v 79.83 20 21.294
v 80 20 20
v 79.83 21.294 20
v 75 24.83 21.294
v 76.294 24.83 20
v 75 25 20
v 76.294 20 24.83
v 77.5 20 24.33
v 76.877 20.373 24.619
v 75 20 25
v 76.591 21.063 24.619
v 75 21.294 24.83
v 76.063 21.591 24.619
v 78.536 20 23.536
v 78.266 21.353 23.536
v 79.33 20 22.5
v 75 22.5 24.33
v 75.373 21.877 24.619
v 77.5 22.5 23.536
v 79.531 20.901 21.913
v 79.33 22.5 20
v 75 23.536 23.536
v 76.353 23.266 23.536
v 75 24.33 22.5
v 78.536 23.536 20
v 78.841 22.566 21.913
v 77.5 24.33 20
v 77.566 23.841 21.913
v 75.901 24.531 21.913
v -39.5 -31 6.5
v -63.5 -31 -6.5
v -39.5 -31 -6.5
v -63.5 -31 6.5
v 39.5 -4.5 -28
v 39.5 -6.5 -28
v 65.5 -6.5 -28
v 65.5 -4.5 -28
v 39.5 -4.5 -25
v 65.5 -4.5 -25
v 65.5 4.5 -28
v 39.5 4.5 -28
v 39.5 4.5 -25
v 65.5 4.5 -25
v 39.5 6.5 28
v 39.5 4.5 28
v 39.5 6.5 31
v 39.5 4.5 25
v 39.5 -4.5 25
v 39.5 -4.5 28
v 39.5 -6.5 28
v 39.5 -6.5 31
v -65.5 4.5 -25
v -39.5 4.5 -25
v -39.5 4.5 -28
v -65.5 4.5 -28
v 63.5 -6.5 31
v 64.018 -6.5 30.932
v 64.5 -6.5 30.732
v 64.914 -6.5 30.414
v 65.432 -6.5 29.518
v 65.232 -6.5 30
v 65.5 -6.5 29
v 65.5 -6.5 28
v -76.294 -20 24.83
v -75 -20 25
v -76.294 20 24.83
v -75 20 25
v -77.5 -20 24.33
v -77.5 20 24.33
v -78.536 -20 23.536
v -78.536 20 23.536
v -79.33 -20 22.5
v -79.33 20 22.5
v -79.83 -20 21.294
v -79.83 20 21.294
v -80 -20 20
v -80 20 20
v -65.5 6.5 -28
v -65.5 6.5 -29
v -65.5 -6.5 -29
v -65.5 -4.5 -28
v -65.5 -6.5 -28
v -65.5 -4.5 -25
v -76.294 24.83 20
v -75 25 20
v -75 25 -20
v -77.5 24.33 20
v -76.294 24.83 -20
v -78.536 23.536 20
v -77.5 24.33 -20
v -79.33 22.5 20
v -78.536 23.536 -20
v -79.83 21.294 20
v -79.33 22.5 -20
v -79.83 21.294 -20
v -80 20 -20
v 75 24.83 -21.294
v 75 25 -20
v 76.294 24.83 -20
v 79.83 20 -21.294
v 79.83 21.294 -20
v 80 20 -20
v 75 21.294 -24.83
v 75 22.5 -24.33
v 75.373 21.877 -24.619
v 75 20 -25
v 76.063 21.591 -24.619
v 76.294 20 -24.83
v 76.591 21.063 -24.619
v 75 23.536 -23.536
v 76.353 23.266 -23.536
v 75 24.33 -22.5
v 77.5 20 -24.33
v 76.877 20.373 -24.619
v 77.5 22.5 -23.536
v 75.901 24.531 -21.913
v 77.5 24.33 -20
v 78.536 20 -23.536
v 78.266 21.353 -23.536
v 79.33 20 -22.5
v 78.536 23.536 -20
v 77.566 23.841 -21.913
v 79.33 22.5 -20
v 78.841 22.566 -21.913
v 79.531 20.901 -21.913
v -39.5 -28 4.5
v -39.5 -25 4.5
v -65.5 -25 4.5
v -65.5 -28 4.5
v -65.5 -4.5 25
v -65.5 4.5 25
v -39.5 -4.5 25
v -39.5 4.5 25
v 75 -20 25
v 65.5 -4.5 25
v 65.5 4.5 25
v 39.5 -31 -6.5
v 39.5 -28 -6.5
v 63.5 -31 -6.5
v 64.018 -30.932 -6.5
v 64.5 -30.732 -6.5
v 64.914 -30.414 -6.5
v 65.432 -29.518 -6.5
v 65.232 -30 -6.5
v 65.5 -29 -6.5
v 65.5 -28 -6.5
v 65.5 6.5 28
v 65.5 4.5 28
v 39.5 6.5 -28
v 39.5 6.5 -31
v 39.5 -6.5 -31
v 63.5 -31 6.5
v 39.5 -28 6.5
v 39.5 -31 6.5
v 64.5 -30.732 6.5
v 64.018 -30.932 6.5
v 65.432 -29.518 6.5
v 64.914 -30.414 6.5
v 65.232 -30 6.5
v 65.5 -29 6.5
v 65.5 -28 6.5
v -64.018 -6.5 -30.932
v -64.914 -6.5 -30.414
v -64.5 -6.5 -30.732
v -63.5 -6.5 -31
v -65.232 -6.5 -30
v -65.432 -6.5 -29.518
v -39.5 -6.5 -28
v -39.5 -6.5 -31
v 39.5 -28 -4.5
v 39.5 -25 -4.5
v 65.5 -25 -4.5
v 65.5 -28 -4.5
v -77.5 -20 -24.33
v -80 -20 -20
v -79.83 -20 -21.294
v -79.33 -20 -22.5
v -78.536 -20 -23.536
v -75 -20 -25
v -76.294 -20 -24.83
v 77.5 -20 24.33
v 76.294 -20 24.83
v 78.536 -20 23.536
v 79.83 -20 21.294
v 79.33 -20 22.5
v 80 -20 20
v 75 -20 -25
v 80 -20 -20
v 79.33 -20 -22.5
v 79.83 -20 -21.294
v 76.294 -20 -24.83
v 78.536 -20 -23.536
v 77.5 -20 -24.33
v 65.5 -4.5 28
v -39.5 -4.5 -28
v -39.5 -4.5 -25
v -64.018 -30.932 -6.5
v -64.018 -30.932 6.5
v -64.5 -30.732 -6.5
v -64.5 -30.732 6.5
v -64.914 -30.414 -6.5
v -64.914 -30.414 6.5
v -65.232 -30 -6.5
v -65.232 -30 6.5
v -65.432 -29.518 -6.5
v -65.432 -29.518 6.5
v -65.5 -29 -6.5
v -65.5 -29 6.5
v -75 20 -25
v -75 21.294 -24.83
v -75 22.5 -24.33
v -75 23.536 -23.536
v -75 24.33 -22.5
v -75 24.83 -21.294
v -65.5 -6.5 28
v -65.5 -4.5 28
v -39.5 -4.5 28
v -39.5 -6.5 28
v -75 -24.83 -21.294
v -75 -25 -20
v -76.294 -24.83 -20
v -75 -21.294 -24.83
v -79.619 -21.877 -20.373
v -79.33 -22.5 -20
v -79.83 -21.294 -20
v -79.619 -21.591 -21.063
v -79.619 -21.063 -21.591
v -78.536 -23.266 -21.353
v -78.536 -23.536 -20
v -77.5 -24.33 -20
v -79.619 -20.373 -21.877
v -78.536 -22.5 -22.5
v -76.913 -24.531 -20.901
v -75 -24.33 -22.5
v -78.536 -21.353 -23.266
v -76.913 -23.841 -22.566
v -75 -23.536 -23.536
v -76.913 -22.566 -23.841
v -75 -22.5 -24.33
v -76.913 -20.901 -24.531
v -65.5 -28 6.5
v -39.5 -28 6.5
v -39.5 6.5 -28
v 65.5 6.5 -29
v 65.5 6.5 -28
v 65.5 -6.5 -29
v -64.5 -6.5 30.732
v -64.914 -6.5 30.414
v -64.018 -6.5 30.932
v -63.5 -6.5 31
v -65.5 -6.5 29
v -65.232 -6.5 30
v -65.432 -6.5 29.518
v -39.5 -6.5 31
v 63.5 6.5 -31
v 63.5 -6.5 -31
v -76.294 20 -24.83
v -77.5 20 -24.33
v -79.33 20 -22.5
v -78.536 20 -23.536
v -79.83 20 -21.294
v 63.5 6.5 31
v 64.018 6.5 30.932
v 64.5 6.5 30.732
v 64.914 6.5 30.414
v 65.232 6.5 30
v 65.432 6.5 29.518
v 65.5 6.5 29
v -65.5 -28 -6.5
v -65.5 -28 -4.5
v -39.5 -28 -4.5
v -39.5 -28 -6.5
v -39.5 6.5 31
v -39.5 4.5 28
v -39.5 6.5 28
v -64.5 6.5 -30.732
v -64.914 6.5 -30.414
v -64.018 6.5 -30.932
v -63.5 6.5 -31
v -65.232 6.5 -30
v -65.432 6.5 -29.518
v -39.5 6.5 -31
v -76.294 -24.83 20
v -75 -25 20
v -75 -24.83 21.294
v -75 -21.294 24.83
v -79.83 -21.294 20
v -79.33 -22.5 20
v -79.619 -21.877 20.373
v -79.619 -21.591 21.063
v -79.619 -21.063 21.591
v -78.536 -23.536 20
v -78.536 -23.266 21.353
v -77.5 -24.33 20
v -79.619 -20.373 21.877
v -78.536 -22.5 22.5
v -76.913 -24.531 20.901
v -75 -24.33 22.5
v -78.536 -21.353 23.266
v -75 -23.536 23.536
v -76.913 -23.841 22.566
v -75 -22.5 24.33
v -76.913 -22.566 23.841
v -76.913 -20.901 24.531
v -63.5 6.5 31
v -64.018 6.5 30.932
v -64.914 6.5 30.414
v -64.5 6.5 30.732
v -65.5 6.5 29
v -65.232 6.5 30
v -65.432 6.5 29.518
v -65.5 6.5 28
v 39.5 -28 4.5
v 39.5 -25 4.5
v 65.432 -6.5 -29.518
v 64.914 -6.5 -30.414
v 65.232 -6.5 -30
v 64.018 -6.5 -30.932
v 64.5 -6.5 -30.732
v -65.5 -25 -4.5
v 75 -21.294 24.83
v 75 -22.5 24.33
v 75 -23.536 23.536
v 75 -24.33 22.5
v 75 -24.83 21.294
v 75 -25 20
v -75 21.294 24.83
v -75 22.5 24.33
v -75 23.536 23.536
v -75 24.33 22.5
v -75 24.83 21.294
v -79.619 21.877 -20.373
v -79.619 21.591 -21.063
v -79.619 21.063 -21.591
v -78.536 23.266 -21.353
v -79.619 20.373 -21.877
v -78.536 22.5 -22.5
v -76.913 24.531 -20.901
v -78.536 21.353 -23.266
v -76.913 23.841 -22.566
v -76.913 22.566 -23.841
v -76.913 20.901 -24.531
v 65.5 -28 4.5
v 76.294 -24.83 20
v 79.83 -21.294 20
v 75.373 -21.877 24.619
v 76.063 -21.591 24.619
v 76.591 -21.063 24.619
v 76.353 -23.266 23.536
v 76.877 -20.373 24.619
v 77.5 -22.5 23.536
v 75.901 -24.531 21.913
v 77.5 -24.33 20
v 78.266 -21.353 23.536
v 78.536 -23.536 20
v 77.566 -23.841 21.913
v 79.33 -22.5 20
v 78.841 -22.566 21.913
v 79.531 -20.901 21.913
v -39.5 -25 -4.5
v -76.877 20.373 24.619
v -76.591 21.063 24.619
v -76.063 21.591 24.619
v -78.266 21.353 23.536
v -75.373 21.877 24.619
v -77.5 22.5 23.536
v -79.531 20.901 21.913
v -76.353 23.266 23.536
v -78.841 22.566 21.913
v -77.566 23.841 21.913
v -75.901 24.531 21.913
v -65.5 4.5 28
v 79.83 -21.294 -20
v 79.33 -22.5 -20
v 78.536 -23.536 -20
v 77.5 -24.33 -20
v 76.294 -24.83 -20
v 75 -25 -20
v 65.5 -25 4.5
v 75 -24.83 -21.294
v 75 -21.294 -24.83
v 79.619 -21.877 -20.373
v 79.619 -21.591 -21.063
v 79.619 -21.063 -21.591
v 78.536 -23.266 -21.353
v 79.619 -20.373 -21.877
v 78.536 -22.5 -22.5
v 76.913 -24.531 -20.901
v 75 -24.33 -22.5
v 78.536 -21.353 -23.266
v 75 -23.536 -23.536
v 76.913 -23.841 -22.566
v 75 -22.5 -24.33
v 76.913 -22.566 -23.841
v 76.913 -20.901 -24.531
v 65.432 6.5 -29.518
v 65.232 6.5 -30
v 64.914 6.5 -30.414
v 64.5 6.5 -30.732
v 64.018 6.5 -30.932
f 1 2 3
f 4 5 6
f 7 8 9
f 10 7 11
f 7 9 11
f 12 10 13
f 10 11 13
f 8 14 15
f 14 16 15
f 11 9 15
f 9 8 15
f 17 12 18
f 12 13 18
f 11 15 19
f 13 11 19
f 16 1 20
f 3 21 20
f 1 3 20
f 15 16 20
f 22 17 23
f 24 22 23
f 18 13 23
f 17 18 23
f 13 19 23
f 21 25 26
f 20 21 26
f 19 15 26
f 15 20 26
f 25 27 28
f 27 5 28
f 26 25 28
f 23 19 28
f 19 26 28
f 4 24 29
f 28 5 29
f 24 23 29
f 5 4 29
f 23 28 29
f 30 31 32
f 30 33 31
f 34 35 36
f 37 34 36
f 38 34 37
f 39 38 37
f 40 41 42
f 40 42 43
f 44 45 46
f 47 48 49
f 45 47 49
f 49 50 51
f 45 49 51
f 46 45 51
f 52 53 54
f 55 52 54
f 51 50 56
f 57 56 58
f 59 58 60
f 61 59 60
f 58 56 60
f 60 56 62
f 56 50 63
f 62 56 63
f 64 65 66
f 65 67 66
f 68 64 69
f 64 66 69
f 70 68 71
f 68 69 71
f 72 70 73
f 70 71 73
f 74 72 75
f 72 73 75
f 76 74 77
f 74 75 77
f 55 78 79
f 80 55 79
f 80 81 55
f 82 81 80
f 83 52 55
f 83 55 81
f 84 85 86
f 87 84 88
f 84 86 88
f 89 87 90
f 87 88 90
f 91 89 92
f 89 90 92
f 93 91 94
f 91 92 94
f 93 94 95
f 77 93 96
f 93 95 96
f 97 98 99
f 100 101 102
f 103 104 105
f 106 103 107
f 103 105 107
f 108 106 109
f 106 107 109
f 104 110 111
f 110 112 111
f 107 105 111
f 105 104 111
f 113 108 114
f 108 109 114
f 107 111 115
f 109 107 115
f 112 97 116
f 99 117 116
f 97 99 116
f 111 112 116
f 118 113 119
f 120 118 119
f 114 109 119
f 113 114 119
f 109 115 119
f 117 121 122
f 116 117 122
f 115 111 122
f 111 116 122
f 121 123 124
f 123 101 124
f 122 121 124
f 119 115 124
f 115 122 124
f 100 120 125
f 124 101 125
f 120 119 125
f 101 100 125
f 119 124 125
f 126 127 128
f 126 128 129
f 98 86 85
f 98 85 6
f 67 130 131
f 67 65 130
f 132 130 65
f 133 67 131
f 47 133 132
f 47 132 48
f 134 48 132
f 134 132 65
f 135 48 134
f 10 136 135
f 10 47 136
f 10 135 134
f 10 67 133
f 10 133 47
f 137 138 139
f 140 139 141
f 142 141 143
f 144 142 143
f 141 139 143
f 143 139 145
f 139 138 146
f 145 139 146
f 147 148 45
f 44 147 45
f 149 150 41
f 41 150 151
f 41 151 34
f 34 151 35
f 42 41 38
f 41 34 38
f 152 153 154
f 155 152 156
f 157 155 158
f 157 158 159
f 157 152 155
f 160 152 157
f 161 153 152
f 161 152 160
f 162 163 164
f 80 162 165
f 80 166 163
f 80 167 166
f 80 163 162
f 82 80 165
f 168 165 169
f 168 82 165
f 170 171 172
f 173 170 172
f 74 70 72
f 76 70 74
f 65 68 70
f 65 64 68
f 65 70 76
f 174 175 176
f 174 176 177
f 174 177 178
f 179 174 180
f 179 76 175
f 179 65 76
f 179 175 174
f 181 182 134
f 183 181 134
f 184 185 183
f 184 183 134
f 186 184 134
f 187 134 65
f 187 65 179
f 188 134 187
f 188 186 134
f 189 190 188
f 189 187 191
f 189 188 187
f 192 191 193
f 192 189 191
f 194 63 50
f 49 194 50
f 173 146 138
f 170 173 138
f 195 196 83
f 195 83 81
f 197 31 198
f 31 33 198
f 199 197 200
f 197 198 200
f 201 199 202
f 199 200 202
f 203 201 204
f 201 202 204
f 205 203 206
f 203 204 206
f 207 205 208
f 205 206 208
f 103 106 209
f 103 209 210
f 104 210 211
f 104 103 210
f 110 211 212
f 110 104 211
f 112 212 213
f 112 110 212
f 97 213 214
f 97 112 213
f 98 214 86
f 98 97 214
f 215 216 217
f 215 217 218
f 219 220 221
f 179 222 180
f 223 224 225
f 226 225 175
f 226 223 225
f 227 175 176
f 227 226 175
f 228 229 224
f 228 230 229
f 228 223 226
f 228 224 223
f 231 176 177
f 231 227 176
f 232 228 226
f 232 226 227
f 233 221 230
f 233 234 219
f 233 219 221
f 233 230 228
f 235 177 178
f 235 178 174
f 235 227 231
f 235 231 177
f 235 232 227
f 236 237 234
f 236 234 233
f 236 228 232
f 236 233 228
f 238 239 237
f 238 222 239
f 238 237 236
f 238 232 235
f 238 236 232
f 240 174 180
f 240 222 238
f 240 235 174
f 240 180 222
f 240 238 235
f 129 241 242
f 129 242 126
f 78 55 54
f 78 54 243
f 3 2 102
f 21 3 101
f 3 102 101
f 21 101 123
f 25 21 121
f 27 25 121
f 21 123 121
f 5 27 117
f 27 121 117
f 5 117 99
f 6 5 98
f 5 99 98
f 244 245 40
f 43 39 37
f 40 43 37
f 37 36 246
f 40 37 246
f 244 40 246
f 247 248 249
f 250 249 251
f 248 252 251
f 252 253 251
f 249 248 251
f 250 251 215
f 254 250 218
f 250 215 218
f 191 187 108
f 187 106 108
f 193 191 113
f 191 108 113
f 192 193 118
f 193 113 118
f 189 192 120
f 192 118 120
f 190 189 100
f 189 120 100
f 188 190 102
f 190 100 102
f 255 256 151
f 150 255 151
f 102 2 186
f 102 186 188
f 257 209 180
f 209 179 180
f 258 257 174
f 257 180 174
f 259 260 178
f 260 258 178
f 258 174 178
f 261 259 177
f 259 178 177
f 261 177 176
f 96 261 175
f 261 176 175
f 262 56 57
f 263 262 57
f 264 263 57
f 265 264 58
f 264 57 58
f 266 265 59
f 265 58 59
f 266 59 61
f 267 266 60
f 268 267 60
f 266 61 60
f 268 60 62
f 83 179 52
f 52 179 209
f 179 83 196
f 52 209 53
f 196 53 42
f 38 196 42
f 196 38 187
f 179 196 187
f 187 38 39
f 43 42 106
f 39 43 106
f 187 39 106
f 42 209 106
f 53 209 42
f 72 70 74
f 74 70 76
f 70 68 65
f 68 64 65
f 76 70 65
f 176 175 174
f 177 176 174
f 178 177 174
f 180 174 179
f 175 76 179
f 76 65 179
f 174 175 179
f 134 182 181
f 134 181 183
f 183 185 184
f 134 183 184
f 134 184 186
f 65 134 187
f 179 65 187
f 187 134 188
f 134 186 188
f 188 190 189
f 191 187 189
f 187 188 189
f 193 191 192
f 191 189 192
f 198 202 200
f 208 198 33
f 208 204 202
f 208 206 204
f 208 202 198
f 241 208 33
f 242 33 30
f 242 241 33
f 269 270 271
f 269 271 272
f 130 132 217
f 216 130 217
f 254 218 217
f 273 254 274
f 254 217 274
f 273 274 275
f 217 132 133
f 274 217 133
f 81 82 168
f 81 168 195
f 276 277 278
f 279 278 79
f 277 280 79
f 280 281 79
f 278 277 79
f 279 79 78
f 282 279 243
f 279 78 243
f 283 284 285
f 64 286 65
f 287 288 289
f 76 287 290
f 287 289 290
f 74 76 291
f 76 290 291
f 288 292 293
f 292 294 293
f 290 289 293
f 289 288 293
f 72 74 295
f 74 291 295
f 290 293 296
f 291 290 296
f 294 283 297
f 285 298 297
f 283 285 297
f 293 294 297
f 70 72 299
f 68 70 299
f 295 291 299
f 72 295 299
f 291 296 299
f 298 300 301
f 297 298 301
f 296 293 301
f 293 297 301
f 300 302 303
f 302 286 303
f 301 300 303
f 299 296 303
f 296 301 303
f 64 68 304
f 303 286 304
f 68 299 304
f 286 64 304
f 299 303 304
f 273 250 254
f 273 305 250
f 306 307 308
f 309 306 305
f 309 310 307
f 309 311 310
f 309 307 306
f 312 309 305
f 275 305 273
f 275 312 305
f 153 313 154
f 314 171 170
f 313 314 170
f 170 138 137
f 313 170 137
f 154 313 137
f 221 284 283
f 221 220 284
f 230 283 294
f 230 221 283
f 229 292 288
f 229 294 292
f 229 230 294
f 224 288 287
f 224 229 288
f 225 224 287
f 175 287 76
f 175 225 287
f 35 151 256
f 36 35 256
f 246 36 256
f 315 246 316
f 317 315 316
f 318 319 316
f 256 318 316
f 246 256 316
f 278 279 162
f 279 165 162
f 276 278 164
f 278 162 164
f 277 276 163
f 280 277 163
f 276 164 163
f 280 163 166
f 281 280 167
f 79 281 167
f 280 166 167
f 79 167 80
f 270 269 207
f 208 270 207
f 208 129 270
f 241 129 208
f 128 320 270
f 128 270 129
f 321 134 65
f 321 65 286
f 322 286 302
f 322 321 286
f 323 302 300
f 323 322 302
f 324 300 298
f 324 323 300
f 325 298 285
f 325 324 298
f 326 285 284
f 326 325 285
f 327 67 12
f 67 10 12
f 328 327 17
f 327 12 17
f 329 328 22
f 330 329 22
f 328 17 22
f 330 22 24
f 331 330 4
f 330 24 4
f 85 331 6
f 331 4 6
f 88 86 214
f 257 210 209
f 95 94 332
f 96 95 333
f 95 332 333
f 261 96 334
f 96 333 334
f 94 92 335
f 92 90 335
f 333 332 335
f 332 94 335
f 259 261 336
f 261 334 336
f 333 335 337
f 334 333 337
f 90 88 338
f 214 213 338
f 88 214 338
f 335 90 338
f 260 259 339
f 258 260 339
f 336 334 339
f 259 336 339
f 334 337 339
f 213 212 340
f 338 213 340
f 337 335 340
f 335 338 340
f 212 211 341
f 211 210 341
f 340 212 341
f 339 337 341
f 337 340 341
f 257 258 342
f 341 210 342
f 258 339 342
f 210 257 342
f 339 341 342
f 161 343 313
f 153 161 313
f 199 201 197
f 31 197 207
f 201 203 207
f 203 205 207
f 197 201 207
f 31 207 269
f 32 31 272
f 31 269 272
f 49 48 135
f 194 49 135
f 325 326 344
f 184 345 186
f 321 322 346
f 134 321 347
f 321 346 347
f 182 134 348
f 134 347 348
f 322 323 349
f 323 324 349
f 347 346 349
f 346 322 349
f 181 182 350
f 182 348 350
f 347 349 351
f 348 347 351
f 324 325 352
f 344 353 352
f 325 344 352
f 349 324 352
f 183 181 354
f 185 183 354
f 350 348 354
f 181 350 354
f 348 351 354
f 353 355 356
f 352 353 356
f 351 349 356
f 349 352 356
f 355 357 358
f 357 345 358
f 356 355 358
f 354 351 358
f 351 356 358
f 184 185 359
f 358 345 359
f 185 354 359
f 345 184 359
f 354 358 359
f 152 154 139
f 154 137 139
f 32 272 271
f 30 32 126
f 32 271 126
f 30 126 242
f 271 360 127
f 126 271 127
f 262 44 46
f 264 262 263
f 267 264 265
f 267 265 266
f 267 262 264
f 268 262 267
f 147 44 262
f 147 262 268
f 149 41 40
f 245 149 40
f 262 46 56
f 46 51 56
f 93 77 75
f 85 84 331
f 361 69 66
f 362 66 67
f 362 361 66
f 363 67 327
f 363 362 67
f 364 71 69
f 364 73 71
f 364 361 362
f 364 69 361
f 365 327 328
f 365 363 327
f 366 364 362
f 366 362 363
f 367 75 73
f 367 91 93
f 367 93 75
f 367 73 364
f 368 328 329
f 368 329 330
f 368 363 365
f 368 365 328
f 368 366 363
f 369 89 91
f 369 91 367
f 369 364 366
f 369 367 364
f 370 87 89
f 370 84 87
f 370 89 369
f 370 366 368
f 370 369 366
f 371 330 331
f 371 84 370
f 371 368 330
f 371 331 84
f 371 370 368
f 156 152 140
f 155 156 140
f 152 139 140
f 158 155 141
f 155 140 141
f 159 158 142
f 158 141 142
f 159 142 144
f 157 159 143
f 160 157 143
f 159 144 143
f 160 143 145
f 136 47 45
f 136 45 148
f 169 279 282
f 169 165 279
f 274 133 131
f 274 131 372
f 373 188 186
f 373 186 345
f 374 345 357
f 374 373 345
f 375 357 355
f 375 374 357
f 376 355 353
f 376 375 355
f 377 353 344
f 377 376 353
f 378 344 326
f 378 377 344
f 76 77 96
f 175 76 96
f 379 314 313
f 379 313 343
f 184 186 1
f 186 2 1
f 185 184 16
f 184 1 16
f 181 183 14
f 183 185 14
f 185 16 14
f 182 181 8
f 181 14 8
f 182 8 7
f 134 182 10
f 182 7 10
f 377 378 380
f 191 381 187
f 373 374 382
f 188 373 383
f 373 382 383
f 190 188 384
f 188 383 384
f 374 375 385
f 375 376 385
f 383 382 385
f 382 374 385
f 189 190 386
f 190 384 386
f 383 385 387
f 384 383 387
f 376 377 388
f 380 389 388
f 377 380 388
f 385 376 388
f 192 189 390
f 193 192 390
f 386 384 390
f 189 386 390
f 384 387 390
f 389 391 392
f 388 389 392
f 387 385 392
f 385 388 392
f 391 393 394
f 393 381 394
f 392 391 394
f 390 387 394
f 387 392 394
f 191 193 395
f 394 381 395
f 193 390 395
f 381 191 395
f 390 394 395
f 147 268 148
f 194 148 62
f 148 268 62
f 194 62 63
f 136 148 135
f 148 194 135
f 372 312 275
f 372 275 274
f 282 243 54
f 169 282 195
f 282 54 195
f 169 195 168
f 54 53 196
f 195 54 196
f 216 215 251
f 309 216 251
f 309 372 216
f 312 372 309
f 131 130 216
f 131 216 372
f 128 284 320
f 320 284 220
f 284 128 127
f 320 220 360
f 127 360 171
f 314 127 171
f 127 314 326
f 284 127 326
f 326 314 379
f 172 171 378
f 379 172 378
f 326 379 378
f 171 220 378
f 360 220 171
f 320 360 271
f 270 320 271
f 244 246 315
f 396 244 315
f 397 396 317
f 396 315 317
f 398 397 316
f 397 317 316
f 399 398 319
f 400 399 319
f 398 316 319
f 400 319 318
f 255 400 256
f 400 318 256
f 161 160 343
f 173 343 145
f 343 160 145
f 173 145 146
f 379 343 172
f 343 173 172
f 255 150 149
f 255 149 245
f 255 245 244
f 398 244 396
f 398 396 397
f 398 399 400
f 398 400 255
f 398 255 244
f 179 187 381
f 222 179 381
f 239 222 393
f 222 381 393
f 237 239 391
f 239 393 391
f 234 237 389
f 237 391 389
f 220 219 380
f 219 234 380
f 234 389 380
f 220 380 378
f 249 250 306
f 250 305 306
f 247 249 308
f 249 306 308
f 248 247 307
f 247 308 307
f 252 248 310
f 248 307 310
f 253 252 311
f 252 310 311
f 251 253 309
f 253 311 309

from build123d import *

# Parameters (mm, degrees)
SKETCH1_W                = 160
SKETCH1_H                = 50
BOSS_EXTRUDE1_DEPTH      = 25
SKETCH2_W                = 26
SKETCH2_H                = 13
CONNECTOR_BASE_DEPTH     = 6
SKETCH3_W                = 2
SKETCH3_H                = 3
DOVETAIL_CUT_DEPTH       = 151.851748415
FILLET1_R                = 2
CIRPATTERN1_COUNT        = 4
FILLET1_OF_CIRPATTERN1_R = 2
MIRROR1_START            = -4.5
MIRROR1_DEPTH            = 9
MIRROR1_START_2          = -6.5
MIRROR1_2_DEPTH          = 13
MIRROR1_3_DEPTH          = 9
MIRROR1_4_DEPTH          = 13
FILLET2_R                = 5
SKETCH4_W                = 150
SKETCH4_H                = 40
CUT_EXTRUDE1_DEPTH       = 6


# Read off the part's stored shape, not the designer's step: Mirror1
with BuildPart() as part:
    # Sketch1 → Boss-Extrude1 (new, symmetric)
    with BuildSketch(Plane(origin=(0, 0, 0), x_dir=(1, 0, 0), z_dir=(0, 1, 0))):
        Rectangle(SKETCH1_W, SKETCH1_H)
    extrude(amount=BOSS_EXTRUDE1_DEPTH, both=True)

    # Sketch2 → connector base (add)
    with BuildSketch(Plane(origin=(0, 25, 0), x_dir=(1, 0, 0), z_dir=(0, 1, 0))):
        with Locations((-52.5, 0)):
            Rectangle(SKETCH2_W, SKETCH2_H)
    connector_base = extrude(amount=CONNECTOR_BASE_DEPTH)

    # Sketch3 → dovetail cut (cut, through all)
    with BuildSketch(Plane.ZY.offset(65.5)):
        with Locations((5.5, 26.5)):
            Rectangle(SKETCH3_W, SKETCH3_H)
        with Locations((-5.5, 26.5)):
            Rectangle(SKETCH3_W, SKETCH3_H)
    dovetail_cut = extrude(amount=-DOVETAIL_CUT_DEPTH, mode=Mode.SUBTRACT)

    # Fillet1
    fillet1_edges = [part.edges().sort_by_distance(p)[0] for p in [
        (-65.5, 31, 0),
    ]]
    fillet(fillet1_edges, radius=FILLET1_R)

    # CirPattern1: connector base, dovetail cut ×4 about axis
    cirpattern1_axis = Axis((0, 0, 0), (1, 0, 0))
    add([connector_base.rotate(cirpattern1_axis, i * 360 / CIRPATTERN1_COUNT) for i in range(1, CIRPATTERN1_COUNT)])
    add([dovetail_cut.rotate(cirpattern1_axis, i * 360 / CIRPATTERN1_COUNT) for i in range(1, CIRPATTERN1_COUNT)], mode=Mode.SUBTRACT)

    # Fillet1 of CirPattern1
    fillet1_of_cirpattern1_edges = [part.edges().sort_by_distance(p)[0] for p in [
        (-65.5, 0, 31),
        (-65.5, -31, 0),
        (-65.5, 0, -31),
    ]]
    fillet(fillet1_of_cirpattern1_edges, radius=FILLET1_OF_CIRPATTERN1_R)

    # Mirror1 outline → Mirror1 (add)
    with BuildSketch(Plane.XY.offset(MIRROR1_START)):
        with BuildLine():
            Line((63.5, 31), (39.5, 31))
            Line((39.5, 31), (39.5, 25))
            Line((39.5, 25), (65.5, 25))
            Line((65.5, 25), (65.5, 29))
            ThreePointArc((65.5, 29), (64.914213562, 30.414213562), (63.5, 31))
        make_face()
        with BuildLine():
            Line((65.5, -25), (39.5, -25))
            Line((39.5, -25), (39.5, -31))
            Line((39.5, -31), (63.5, -31))
            ThreePointArc((63.5, -31), (64.914213562, -30.414213562), (65.5, -29))
            Line((65.5, -29), (65.5, -25))
        make_face()
    extrude(amount=MIRROR1_DEPTH)

    # Mirror1 2 outline → Mirror1 2 (add)
    with BuildSketch(Plane.XY.offset(MIRROR1_START_2)):
        with BuildLine():
            Line((63.5, 31), (39.5, 31))
            Line((39.5, 31), (39.5, 28))
            Line((39.5, 28), (65.5, 28))
            Line((65.5, 28), (65.5, 29))
            ThreePointArc((65.5, 29), (64.914213562, 30.414213562), (63.5, 31))
        make_face()
        with BuildLine():
            Line((65.5, -28), (39.5, -28))
            Line((39.5, -28), (39.5, -31))
            Line((39.5, -31), (63.5, -31))
            ThreePointArc((63.5, -31), (64.914213562, -30.414213562), (65.5, -29))
            Line((65.5, -29), (65.5, -28))
        make_face()
    extrude(amount=MIRROR1_2_DEPTH)

    # Mirror1 3 outline → Mirror1 3 (add)
    with BuildSketch(Plane(origin=(0, 0, 0), x_dir=(1, 0, 0), z_dir=(0, 1, 0)).offset(MIRROR1_START)):
        with BuildLine():
            Line((63.5, 31), (39.5, 31))
            Line((39.5, 31), (39.5, 25))
            Line((39.5, 25), (65.5, 25))
            Line((65.5, 25), (65.5, 29))
            ThreePointArc((65.5, 29), (64.914213562, 30.414213562), (63.5, 31))
        make_face()
        with BuildLine():
            Line((65.5, -25), (39.5, -25))
            Line((39.5, -25), (39.5, -31))
            Line((39.5, -31), (63.5, -31))
            ThreePointArc((63.5, -31), (64.914213562, -30.414213562), (65.5, -29))
            Line((65.5, -29), (65.5, -25))
        make_face()
    extrude(amount=MIRROR1_3_DEPTH)

    # Mirror1 4 outline → Mirror1 4 (add)
    with BuildSketch(Plane(origin=(0, 0, 0), x_dir=(1, 0, 0), z_dir=(0, 1, 0)).offset(MIRROR1_START_2)):
        with BuildLine():
            Line((63.5, 31), (39.5, 31))
            Line((39.5, 31), (39.5, 28))
            Line((39.5, 28), (65.5, 28))
            Line((65.5, 28), (65.5, 29))
            ThreePointArc((65.5, 29), (64.914213562, 30.414213562), (63.5, 31))
        make_face()
        with BuildLine():
            Line((65.5, -28), (39.5, -28))
            Line((39.5, -28), (39.5, -31))
            Line((39.5, -31), (63.5, -31))
            ThreePointArc((63.5, -31), (64.914213562, -30.414213562), (65.5, -29))
            Line((65.5, -29), (65.5, -28))
        make_face()
    extrude(amount=MIRROR1_4_DEPTH)

    # Fillet2
    fillet2_edges = [part.edges().sort_by_distance(p)[0] for p in [
        (80, 25, 0),
        (0, 25, -25),
        (-80, 25, 0),
        (0, -25, -25),
        (80, -25, 0),
        (0, -25, 25),
        (-80, -25, 0),
        (-80, 0, -25),
        (80, 0, -25),
        (80, 0, 25),
        (-80, 0, 25),
        (0, 25, 25),
    ]]
    fillet(fillet2_edges, radius=FILLET2_R)

    # Sketch4 → Cut-Extrude1 (cut)
    with BuildSketch(Plane(origin=(0, 31, 0), x_dir=(1, 0, 0), z_dir=(0, 1, 0))):
        Rectangle(SKETCH4_W, SKETCH4_H)
    extrude(amount=-CUT_EXTRUDE1_DEPTH, mode=Mode.SUBTRACT)


with BuildPart() as body_2:
    # Split1: the piece on the far side of the plane
    add(part.part)
    split(bisect_by=Plane(origin=(0, -20, 0), x_dir=(0, 0, -1), z_dir=(0, -1, 0)), keep=Keep.BOTTOM)


with BuildPart() as part_1:
    add(part.part)

    # Split1
    split(bisect_by=Plane(origin=(0, -20, 0), x_dir=(0, 0, -1), z_dir=(0, -1, 0)), keep=Keep.TOP)


solid = Compound([body_2.part, part_1.part])
